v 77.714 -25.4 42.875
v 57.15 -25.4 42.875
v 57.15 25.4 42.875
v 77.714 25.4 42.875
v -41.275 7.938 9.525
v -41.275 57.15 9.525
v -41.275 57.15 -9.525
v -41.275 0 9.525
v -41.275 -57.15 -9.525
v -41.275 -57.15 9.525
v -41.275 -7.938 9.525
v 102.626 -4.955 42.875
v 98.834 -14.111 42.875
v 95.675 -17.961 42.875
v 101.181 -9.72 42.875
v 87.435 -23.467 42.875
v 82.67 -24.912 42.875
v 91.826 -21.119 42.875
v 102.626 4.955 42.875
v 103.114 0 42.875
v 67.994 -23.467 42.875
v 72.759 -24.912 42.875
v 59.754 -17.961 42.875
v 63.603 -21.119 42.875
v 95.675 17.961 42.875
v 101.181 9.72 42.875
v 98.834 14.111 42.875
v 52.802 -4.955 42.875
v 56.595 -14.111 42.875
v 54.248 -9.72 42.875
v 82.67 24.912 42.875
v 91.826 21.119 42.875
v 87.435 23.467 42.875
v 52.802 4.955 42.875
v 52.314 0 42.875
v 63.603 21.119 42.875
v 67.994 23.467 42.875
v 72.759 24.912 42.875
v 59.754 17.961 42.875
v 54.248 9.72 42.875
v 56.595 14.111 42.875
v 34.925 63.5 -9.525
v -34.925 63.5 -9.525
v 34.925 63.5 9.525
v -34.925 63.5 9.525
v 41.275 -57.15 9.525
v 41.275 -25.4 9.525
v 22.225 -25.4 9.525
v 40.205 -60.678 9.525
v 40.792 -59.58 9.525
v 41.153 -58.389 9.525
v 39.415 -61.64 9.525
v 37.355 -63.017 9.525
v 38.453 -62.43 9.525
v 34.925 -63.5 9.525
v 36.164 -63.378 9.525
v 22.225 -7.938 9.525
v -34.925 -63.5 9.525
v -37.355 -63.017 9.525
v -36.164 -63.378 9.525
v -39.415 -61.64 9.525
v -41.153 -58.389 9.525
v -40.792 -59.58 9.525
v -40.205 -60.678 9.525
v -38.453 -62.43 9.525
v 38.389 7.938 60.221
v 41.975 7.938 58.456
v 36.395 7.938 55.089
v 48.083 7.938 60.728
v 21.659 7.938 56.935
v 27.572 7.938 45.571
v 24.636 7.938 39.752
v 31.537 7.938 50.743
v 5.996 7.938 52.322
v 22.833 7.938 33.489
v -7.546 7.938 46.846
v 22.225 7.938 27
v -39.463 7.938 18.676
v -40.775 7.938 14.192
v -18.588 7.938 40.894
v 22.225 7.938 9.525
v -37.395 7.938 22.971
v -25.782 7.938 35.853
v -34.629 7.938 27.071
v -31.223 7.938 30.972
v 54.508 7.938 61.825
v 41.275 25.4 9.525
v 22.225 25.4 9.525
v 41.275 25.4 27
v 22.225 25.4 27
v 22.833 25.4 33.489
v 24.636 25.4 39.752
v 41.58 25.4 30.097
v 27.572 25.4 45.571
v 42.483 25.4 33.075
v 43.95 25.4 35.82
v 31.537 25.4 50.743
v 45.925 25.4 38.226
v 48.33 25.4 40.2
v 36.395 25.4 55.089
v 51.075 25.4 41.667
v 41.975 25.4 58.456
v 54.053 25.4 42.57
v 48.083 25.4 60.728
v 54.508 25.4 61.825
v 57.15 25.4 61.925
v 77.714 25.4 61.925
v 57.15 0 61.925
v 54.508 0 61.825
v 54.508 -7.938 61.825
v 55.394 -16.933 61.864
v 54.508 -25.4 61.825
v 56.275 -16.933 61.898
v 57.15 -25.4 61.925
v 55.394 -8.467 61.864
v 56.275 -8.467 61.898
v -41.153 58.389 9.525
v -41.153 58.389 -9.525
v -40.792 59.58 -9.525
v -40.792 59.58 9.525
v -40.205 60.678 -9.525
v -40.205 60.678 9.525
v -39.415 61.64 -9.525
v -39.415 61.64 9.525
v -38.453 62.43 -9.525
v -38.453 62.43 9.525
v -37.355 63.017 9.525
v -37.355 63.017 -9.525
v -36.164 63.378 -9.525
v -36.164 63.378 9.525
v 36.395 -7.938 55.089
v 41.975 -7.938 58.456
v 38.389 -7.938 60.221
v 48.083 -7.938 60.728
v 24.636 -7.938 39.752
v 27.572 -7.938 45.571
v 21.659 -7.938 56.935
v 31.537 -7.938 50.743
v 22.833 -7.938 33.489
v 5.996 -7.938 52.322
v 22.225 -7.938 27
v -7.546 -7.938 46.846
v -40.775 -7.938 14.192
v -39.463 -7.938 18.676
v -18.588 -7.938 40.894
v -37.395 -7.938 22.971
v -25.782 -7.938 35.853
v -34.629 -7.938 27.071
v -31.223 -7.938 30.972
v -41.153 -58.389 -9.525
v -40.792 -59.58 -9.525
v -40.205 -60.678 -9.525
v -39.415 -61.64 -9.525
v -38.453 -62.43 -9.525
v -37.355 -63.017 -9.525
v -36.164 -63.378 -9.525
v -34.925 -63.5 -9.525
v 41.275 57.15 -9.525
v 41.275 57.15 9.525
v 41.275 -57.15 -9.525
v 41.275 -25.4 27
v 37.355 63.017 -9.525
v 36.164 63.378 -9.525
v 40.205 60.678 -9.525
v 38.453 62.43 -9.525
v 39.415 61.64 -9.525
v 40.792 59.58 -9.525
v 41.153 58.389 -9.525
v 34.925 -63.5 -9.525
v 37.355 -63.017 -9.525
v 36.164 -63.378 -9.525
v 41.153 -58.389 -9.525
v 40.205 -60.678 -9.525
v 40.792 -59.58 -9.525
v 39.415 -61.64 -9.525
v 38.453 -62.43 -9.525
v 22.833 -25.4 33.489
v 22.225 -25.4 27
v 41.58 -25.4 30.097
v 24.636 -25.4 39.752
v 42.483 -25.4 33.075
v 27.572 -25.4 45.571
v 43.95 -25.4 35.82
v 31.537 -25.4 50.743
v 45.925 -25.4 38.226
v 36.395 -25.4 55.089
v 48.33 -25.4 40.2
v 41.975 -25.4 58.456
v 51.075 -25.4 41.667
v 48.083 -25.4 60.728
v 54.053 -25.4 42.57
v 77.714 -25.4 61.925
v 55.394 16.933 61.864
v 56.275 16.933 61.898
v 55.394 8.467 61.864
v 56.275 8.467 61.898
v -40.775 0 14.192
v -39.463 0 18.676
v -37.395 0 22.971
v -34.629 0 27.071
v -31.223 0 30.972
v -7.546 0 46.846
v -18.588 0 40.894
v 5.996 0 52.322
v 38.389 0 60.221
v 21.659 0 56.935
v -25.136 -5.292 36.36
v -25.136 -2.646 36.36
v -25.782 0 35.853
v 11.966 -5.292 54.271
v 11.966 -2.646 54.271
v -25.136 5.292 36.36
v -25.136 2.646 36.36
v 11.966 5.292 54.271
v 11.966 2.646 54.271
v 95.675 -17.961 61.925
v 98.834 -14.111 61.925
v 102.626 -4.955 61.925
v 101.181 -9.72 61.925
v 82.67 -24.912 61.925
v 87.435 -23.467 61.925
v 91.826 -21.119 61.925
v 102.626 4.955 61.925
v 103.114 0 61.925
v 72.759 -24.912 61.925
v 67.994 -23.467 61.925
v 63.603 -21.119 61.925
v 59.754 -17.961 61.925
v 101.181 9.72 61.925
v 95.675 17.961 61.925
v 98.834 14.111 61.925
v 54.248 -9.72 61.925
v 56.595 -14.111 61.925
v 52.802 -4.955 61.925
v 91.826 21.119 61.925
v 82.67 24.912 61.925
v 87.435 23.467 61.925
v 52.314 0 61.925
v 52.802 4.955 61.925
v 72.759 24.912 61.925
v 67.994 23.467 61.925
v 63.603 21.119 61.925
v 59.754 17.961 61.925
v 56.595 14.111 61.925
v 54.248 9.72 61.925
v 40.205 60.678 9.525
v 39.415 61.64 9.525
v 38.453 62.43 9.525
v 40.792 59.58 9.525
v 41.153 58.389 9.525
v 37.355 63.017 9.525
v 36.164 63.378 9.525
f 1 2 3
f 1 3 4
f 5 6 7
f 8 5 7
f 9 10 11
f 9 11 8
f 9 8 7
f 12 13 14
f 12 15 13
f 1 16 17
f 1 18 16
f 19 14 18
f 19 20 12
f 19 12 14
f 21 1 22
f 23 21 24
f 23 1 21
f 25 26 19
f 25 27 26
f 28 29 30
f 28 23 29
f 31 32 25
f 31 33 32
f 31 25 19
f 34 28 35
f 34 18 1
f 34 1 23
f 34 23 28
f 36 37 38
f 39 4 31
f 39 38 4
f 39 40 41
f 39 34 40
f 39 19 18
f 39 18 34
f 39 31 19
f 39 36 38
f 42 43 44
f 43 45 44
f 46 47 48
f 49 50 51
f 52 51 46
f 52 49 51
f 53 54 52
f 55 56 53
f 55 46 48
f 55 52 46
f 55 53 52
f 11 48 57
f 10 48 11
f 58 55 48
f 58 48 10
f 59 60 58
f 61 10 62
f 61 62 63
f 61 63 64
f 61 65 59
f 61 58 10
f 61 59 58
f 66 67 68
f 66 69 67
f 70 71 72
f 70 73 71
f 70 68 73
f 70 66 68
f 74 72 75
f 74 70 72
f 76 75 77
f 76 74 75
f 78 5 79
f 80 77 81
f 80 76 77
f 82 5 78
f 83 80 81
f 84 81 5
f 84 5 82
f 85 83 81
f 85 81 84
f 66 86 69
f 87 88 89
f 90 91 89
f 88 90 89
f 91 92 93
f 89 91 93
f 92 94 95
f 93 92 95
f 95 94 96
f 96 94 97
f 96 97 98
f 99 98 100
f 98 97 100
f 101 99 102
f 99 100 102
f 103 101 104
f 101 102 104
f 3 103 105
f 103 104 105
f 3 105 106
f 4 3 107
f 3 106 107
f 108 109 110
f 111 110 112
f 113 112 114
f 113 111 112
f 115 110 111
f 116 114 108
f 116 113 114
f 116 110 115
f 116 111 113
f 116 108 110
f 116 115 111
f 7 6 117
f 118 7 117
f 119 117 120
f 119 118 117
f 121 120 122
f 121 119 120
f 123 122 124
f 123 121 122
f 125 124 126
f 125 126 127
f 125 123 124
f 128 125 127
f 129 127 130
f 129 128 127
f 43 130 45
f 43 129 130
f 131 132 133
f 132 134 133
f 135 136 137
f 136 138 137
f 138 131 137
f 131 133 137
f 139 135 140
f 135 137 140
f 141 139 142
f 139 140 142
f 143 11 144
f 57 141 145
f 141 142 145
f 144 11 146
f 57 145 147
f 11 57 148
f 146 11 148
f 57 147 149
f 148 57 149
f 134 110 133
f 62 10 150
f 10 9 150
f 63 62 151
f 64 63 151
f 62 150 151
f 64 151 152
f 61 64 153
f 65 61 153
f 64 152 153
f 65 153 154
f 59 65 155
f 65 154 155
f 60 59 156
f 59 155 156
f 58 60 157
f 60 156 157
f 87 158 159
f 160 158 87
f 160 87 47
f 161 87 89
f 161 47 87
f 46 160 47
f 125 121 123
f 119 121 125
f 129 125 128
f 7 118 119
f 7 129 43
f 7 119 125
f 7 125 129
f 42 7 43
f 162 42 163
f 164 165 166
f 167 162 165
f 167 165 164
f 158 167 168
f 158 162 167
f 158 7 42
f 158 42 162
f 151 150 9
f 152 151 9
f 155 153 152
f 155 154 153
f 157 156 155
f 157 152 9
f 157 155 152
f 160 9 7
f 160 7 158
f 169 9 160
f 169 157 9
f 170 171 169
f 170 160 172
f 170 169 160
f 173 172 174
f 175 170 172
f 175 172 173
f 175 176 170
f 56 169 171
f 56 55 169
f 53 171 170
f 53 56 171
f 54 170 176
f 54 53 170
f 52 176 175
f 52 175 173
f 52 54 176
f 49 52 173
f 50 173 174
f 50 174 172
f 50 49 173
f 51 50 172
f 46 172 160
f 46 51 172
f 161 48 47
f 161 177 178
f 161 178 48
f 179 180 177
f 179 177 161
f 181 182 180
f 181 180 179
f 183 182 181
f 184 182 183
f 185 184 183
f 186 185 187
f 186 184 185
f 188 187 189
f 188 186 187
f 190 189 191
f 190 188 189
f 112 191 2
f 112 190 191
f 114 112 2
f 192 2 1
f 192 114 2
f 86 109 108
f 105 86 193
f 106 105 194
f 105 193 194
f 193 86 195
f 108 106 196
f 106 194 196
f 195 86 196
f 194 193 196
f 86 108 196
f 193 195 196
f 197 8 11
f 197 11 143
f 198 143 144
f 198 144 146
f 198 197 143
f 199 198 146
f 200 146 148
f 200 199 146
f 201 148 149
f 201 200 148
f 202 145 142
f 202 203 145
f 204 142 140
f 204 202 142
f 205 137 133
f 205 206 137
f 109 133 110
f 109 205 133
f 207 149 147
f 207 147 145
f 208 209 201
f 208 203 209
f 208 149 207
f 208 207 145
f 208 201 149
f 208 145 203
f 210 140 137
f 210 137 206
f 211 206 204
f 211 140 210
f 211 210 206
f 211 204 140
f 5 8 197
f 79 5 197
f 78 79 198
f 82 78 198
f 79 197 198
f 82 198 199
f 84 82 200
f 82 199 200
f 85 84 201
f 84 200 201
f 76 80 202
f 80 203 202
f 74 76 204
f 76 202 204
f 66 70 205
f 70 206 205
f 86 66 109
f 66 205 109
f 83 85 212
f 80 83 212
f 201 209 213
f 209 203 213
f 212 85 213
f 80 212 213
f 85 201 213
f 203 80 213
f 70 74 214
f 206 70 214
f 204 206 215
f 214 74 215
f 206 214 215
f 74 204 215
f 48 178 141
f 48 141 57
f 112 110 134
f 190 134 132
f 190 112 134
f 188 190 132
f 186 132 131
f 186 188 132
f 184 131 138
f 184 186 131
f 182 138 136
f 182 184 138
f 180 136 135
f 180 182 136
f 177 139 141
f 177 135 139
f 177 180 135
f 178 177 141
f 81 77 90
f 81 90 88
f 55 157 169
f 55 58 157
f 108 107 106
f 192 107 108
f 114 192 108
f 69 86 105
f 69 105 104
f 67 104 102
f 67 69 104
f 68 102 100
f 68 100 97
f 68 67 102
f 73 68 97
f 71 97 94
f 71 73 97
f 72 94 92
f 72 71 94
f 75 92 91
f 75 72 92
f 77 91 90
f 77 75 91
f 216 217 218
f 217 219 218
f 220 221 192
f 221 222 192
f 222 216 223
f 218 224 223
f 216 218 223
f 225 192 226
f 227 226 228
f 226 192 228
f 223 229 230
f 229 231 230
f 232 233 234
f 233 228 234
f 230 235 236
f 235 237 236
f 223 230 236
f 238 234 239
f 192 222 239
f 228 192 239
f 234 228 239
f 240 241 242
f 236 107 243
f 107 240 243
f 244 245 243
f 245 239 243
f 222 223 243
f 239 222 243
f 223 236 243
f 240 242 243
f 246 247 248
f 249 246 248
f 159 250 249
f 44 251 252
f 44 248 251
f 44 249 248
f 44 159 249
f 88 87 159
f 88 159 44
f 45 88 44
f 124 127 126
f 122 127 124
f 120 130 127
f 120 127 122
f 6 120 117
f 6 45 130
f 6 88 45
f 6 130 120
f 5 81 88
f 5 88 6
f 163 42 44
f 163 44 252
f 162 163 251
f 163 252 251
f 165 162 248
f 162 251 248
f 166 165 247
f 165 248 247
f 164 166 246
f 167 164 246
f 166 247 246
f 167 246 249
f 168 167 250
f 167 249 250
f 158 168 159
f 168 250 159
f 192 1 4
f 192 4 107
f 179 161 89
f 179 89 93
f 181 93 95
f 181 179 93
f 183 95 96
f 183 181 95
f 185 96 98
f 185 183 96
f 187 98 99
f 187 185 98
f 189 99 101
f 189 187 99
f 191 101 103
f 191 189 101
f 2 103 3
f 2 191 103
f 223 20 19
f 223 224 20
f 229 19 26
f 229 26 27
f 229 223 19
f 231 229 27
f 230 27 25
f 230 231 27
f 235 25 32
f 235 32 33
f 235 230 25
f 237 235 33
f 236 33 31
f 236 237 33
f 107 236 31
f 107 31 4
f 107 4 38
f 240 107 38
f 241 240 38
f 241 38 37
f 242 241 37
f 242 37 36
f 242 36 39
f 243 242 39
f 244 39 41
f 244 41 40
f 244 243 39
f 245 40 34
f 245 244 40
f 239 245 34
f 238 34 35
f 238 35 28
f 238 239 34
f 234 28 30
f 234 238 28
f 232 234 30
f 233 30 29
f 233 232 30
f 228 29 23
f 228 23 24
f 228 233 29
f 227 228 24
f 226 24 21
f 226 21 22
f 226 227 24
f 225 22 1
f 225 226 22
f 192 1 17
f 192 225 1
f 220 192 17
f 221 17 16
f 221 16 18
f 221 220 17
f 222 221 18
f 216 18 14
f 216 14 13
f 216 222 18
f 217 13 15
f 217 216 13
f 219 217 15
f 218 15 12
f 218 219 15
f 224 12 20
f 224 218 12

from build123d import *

# Parameters (mm, degrees)
F1_DEPTH = 63.5
F2_DEPTH = 25.4
F3_DEPTH = 7.9375
F0_W     = 25.4
F0_H     = 19.05
F5_R     = 6.35


with BuildPart() as f1:
    # F0 (on Front) → F1 (new body, symmetric)
    with BuildSketch(Plane.XZ):
        Polygon((-41.275, -9.525), (41.275, -9.525), (41.275, 9.525), (22.225, 9.525), (-41.275, 9.525), align=None)
    extrude(amount=F1_DEPTH, both=True)

    # F0 (on Front) → F2 (join, symmetric)
    with BuildSketch(Plane.XZ):
        with BuildLine():
            Line((22.225, 9.525), (41.275, 9.525))
            Line((41.275, 9.525), (41.275, 27.0002))
            ThreePointArc((41.275, 27.0002), (45.92468, 38.22552), (57.15, 42.8752))
            Line((57.15, 42.8752), (77.714364, 42.8752))
            Line((77.714364, 42.8752), (77.714364, 61.9252))
            Line((77.714364, 61.9252), (57.15, 61.9252))
            add(Edge.make_bspline(
                [(54.507831, 61.825113), (55.396234, 61.867184), (56.27721, 61.90057), (57.15, 61.9252)],
                knots=[109.087044, 109.087044, 109.087044, 109.087044, 111.504536, 111.504536, 111.504536, 111.504536], degree=3))
            ThreePointArc((54.507831, 61.825113), (31.537177, 50.743387), (22.225, 27.0002))
            Line((22.225, 27.0002), (22.225, 9.525))
        make_face()
    extrude(amount=F2_DEPTH, both=True)

    # F0 (on Front) → F3 (join, symmetric)
    with BuildSketch(Plane.XZ):
        with BuildLine():
            add(Edge.make_bspline(
                [(-41.275, 9.525), (-40.790766, 40.343855), (14.419496, 59.926707), (54.507831, 61.825113)],
                knots=[0, 0, 0, 0, 109.087044, 109.087044, 109.087044, 109.087044], degree=3))
            Line((-41.275, 9.525), (22.225, 9.525))
            Line((22.225, 9.525), (22.225, 27.0002))
            ThreePointArc((22.225, 27.0002), (31.537177, 50.743387), (54.507831, 61.825113))
        make_face()
    extrude(amount=F3_DEPTH, both=True)

    # F5
    f5_edges = [f1.edges().sort_by_distance(p)[0] for p in [
        (41.275, -63.5, 0),
        (-41.275, -63.5, 0),
        (41.275, 63.5, 0),
        (-41.275, 63.5, 0),
    ]]
    fillet(f5_edges, radius=F5_R)


with BuildPart() as f4:
    # F0 (on Front) → F4 (revolve)
    with BuildSketch(Plane.XZ):
        with Locations((90.414364, 52.4002)):
            Rectangle(F0_W, F0_H)
    revolve(axis=Axis((77.714364, 0, 52.3875), (0, 0, 1)))


solid = Compound([f1.part, f4.part])
